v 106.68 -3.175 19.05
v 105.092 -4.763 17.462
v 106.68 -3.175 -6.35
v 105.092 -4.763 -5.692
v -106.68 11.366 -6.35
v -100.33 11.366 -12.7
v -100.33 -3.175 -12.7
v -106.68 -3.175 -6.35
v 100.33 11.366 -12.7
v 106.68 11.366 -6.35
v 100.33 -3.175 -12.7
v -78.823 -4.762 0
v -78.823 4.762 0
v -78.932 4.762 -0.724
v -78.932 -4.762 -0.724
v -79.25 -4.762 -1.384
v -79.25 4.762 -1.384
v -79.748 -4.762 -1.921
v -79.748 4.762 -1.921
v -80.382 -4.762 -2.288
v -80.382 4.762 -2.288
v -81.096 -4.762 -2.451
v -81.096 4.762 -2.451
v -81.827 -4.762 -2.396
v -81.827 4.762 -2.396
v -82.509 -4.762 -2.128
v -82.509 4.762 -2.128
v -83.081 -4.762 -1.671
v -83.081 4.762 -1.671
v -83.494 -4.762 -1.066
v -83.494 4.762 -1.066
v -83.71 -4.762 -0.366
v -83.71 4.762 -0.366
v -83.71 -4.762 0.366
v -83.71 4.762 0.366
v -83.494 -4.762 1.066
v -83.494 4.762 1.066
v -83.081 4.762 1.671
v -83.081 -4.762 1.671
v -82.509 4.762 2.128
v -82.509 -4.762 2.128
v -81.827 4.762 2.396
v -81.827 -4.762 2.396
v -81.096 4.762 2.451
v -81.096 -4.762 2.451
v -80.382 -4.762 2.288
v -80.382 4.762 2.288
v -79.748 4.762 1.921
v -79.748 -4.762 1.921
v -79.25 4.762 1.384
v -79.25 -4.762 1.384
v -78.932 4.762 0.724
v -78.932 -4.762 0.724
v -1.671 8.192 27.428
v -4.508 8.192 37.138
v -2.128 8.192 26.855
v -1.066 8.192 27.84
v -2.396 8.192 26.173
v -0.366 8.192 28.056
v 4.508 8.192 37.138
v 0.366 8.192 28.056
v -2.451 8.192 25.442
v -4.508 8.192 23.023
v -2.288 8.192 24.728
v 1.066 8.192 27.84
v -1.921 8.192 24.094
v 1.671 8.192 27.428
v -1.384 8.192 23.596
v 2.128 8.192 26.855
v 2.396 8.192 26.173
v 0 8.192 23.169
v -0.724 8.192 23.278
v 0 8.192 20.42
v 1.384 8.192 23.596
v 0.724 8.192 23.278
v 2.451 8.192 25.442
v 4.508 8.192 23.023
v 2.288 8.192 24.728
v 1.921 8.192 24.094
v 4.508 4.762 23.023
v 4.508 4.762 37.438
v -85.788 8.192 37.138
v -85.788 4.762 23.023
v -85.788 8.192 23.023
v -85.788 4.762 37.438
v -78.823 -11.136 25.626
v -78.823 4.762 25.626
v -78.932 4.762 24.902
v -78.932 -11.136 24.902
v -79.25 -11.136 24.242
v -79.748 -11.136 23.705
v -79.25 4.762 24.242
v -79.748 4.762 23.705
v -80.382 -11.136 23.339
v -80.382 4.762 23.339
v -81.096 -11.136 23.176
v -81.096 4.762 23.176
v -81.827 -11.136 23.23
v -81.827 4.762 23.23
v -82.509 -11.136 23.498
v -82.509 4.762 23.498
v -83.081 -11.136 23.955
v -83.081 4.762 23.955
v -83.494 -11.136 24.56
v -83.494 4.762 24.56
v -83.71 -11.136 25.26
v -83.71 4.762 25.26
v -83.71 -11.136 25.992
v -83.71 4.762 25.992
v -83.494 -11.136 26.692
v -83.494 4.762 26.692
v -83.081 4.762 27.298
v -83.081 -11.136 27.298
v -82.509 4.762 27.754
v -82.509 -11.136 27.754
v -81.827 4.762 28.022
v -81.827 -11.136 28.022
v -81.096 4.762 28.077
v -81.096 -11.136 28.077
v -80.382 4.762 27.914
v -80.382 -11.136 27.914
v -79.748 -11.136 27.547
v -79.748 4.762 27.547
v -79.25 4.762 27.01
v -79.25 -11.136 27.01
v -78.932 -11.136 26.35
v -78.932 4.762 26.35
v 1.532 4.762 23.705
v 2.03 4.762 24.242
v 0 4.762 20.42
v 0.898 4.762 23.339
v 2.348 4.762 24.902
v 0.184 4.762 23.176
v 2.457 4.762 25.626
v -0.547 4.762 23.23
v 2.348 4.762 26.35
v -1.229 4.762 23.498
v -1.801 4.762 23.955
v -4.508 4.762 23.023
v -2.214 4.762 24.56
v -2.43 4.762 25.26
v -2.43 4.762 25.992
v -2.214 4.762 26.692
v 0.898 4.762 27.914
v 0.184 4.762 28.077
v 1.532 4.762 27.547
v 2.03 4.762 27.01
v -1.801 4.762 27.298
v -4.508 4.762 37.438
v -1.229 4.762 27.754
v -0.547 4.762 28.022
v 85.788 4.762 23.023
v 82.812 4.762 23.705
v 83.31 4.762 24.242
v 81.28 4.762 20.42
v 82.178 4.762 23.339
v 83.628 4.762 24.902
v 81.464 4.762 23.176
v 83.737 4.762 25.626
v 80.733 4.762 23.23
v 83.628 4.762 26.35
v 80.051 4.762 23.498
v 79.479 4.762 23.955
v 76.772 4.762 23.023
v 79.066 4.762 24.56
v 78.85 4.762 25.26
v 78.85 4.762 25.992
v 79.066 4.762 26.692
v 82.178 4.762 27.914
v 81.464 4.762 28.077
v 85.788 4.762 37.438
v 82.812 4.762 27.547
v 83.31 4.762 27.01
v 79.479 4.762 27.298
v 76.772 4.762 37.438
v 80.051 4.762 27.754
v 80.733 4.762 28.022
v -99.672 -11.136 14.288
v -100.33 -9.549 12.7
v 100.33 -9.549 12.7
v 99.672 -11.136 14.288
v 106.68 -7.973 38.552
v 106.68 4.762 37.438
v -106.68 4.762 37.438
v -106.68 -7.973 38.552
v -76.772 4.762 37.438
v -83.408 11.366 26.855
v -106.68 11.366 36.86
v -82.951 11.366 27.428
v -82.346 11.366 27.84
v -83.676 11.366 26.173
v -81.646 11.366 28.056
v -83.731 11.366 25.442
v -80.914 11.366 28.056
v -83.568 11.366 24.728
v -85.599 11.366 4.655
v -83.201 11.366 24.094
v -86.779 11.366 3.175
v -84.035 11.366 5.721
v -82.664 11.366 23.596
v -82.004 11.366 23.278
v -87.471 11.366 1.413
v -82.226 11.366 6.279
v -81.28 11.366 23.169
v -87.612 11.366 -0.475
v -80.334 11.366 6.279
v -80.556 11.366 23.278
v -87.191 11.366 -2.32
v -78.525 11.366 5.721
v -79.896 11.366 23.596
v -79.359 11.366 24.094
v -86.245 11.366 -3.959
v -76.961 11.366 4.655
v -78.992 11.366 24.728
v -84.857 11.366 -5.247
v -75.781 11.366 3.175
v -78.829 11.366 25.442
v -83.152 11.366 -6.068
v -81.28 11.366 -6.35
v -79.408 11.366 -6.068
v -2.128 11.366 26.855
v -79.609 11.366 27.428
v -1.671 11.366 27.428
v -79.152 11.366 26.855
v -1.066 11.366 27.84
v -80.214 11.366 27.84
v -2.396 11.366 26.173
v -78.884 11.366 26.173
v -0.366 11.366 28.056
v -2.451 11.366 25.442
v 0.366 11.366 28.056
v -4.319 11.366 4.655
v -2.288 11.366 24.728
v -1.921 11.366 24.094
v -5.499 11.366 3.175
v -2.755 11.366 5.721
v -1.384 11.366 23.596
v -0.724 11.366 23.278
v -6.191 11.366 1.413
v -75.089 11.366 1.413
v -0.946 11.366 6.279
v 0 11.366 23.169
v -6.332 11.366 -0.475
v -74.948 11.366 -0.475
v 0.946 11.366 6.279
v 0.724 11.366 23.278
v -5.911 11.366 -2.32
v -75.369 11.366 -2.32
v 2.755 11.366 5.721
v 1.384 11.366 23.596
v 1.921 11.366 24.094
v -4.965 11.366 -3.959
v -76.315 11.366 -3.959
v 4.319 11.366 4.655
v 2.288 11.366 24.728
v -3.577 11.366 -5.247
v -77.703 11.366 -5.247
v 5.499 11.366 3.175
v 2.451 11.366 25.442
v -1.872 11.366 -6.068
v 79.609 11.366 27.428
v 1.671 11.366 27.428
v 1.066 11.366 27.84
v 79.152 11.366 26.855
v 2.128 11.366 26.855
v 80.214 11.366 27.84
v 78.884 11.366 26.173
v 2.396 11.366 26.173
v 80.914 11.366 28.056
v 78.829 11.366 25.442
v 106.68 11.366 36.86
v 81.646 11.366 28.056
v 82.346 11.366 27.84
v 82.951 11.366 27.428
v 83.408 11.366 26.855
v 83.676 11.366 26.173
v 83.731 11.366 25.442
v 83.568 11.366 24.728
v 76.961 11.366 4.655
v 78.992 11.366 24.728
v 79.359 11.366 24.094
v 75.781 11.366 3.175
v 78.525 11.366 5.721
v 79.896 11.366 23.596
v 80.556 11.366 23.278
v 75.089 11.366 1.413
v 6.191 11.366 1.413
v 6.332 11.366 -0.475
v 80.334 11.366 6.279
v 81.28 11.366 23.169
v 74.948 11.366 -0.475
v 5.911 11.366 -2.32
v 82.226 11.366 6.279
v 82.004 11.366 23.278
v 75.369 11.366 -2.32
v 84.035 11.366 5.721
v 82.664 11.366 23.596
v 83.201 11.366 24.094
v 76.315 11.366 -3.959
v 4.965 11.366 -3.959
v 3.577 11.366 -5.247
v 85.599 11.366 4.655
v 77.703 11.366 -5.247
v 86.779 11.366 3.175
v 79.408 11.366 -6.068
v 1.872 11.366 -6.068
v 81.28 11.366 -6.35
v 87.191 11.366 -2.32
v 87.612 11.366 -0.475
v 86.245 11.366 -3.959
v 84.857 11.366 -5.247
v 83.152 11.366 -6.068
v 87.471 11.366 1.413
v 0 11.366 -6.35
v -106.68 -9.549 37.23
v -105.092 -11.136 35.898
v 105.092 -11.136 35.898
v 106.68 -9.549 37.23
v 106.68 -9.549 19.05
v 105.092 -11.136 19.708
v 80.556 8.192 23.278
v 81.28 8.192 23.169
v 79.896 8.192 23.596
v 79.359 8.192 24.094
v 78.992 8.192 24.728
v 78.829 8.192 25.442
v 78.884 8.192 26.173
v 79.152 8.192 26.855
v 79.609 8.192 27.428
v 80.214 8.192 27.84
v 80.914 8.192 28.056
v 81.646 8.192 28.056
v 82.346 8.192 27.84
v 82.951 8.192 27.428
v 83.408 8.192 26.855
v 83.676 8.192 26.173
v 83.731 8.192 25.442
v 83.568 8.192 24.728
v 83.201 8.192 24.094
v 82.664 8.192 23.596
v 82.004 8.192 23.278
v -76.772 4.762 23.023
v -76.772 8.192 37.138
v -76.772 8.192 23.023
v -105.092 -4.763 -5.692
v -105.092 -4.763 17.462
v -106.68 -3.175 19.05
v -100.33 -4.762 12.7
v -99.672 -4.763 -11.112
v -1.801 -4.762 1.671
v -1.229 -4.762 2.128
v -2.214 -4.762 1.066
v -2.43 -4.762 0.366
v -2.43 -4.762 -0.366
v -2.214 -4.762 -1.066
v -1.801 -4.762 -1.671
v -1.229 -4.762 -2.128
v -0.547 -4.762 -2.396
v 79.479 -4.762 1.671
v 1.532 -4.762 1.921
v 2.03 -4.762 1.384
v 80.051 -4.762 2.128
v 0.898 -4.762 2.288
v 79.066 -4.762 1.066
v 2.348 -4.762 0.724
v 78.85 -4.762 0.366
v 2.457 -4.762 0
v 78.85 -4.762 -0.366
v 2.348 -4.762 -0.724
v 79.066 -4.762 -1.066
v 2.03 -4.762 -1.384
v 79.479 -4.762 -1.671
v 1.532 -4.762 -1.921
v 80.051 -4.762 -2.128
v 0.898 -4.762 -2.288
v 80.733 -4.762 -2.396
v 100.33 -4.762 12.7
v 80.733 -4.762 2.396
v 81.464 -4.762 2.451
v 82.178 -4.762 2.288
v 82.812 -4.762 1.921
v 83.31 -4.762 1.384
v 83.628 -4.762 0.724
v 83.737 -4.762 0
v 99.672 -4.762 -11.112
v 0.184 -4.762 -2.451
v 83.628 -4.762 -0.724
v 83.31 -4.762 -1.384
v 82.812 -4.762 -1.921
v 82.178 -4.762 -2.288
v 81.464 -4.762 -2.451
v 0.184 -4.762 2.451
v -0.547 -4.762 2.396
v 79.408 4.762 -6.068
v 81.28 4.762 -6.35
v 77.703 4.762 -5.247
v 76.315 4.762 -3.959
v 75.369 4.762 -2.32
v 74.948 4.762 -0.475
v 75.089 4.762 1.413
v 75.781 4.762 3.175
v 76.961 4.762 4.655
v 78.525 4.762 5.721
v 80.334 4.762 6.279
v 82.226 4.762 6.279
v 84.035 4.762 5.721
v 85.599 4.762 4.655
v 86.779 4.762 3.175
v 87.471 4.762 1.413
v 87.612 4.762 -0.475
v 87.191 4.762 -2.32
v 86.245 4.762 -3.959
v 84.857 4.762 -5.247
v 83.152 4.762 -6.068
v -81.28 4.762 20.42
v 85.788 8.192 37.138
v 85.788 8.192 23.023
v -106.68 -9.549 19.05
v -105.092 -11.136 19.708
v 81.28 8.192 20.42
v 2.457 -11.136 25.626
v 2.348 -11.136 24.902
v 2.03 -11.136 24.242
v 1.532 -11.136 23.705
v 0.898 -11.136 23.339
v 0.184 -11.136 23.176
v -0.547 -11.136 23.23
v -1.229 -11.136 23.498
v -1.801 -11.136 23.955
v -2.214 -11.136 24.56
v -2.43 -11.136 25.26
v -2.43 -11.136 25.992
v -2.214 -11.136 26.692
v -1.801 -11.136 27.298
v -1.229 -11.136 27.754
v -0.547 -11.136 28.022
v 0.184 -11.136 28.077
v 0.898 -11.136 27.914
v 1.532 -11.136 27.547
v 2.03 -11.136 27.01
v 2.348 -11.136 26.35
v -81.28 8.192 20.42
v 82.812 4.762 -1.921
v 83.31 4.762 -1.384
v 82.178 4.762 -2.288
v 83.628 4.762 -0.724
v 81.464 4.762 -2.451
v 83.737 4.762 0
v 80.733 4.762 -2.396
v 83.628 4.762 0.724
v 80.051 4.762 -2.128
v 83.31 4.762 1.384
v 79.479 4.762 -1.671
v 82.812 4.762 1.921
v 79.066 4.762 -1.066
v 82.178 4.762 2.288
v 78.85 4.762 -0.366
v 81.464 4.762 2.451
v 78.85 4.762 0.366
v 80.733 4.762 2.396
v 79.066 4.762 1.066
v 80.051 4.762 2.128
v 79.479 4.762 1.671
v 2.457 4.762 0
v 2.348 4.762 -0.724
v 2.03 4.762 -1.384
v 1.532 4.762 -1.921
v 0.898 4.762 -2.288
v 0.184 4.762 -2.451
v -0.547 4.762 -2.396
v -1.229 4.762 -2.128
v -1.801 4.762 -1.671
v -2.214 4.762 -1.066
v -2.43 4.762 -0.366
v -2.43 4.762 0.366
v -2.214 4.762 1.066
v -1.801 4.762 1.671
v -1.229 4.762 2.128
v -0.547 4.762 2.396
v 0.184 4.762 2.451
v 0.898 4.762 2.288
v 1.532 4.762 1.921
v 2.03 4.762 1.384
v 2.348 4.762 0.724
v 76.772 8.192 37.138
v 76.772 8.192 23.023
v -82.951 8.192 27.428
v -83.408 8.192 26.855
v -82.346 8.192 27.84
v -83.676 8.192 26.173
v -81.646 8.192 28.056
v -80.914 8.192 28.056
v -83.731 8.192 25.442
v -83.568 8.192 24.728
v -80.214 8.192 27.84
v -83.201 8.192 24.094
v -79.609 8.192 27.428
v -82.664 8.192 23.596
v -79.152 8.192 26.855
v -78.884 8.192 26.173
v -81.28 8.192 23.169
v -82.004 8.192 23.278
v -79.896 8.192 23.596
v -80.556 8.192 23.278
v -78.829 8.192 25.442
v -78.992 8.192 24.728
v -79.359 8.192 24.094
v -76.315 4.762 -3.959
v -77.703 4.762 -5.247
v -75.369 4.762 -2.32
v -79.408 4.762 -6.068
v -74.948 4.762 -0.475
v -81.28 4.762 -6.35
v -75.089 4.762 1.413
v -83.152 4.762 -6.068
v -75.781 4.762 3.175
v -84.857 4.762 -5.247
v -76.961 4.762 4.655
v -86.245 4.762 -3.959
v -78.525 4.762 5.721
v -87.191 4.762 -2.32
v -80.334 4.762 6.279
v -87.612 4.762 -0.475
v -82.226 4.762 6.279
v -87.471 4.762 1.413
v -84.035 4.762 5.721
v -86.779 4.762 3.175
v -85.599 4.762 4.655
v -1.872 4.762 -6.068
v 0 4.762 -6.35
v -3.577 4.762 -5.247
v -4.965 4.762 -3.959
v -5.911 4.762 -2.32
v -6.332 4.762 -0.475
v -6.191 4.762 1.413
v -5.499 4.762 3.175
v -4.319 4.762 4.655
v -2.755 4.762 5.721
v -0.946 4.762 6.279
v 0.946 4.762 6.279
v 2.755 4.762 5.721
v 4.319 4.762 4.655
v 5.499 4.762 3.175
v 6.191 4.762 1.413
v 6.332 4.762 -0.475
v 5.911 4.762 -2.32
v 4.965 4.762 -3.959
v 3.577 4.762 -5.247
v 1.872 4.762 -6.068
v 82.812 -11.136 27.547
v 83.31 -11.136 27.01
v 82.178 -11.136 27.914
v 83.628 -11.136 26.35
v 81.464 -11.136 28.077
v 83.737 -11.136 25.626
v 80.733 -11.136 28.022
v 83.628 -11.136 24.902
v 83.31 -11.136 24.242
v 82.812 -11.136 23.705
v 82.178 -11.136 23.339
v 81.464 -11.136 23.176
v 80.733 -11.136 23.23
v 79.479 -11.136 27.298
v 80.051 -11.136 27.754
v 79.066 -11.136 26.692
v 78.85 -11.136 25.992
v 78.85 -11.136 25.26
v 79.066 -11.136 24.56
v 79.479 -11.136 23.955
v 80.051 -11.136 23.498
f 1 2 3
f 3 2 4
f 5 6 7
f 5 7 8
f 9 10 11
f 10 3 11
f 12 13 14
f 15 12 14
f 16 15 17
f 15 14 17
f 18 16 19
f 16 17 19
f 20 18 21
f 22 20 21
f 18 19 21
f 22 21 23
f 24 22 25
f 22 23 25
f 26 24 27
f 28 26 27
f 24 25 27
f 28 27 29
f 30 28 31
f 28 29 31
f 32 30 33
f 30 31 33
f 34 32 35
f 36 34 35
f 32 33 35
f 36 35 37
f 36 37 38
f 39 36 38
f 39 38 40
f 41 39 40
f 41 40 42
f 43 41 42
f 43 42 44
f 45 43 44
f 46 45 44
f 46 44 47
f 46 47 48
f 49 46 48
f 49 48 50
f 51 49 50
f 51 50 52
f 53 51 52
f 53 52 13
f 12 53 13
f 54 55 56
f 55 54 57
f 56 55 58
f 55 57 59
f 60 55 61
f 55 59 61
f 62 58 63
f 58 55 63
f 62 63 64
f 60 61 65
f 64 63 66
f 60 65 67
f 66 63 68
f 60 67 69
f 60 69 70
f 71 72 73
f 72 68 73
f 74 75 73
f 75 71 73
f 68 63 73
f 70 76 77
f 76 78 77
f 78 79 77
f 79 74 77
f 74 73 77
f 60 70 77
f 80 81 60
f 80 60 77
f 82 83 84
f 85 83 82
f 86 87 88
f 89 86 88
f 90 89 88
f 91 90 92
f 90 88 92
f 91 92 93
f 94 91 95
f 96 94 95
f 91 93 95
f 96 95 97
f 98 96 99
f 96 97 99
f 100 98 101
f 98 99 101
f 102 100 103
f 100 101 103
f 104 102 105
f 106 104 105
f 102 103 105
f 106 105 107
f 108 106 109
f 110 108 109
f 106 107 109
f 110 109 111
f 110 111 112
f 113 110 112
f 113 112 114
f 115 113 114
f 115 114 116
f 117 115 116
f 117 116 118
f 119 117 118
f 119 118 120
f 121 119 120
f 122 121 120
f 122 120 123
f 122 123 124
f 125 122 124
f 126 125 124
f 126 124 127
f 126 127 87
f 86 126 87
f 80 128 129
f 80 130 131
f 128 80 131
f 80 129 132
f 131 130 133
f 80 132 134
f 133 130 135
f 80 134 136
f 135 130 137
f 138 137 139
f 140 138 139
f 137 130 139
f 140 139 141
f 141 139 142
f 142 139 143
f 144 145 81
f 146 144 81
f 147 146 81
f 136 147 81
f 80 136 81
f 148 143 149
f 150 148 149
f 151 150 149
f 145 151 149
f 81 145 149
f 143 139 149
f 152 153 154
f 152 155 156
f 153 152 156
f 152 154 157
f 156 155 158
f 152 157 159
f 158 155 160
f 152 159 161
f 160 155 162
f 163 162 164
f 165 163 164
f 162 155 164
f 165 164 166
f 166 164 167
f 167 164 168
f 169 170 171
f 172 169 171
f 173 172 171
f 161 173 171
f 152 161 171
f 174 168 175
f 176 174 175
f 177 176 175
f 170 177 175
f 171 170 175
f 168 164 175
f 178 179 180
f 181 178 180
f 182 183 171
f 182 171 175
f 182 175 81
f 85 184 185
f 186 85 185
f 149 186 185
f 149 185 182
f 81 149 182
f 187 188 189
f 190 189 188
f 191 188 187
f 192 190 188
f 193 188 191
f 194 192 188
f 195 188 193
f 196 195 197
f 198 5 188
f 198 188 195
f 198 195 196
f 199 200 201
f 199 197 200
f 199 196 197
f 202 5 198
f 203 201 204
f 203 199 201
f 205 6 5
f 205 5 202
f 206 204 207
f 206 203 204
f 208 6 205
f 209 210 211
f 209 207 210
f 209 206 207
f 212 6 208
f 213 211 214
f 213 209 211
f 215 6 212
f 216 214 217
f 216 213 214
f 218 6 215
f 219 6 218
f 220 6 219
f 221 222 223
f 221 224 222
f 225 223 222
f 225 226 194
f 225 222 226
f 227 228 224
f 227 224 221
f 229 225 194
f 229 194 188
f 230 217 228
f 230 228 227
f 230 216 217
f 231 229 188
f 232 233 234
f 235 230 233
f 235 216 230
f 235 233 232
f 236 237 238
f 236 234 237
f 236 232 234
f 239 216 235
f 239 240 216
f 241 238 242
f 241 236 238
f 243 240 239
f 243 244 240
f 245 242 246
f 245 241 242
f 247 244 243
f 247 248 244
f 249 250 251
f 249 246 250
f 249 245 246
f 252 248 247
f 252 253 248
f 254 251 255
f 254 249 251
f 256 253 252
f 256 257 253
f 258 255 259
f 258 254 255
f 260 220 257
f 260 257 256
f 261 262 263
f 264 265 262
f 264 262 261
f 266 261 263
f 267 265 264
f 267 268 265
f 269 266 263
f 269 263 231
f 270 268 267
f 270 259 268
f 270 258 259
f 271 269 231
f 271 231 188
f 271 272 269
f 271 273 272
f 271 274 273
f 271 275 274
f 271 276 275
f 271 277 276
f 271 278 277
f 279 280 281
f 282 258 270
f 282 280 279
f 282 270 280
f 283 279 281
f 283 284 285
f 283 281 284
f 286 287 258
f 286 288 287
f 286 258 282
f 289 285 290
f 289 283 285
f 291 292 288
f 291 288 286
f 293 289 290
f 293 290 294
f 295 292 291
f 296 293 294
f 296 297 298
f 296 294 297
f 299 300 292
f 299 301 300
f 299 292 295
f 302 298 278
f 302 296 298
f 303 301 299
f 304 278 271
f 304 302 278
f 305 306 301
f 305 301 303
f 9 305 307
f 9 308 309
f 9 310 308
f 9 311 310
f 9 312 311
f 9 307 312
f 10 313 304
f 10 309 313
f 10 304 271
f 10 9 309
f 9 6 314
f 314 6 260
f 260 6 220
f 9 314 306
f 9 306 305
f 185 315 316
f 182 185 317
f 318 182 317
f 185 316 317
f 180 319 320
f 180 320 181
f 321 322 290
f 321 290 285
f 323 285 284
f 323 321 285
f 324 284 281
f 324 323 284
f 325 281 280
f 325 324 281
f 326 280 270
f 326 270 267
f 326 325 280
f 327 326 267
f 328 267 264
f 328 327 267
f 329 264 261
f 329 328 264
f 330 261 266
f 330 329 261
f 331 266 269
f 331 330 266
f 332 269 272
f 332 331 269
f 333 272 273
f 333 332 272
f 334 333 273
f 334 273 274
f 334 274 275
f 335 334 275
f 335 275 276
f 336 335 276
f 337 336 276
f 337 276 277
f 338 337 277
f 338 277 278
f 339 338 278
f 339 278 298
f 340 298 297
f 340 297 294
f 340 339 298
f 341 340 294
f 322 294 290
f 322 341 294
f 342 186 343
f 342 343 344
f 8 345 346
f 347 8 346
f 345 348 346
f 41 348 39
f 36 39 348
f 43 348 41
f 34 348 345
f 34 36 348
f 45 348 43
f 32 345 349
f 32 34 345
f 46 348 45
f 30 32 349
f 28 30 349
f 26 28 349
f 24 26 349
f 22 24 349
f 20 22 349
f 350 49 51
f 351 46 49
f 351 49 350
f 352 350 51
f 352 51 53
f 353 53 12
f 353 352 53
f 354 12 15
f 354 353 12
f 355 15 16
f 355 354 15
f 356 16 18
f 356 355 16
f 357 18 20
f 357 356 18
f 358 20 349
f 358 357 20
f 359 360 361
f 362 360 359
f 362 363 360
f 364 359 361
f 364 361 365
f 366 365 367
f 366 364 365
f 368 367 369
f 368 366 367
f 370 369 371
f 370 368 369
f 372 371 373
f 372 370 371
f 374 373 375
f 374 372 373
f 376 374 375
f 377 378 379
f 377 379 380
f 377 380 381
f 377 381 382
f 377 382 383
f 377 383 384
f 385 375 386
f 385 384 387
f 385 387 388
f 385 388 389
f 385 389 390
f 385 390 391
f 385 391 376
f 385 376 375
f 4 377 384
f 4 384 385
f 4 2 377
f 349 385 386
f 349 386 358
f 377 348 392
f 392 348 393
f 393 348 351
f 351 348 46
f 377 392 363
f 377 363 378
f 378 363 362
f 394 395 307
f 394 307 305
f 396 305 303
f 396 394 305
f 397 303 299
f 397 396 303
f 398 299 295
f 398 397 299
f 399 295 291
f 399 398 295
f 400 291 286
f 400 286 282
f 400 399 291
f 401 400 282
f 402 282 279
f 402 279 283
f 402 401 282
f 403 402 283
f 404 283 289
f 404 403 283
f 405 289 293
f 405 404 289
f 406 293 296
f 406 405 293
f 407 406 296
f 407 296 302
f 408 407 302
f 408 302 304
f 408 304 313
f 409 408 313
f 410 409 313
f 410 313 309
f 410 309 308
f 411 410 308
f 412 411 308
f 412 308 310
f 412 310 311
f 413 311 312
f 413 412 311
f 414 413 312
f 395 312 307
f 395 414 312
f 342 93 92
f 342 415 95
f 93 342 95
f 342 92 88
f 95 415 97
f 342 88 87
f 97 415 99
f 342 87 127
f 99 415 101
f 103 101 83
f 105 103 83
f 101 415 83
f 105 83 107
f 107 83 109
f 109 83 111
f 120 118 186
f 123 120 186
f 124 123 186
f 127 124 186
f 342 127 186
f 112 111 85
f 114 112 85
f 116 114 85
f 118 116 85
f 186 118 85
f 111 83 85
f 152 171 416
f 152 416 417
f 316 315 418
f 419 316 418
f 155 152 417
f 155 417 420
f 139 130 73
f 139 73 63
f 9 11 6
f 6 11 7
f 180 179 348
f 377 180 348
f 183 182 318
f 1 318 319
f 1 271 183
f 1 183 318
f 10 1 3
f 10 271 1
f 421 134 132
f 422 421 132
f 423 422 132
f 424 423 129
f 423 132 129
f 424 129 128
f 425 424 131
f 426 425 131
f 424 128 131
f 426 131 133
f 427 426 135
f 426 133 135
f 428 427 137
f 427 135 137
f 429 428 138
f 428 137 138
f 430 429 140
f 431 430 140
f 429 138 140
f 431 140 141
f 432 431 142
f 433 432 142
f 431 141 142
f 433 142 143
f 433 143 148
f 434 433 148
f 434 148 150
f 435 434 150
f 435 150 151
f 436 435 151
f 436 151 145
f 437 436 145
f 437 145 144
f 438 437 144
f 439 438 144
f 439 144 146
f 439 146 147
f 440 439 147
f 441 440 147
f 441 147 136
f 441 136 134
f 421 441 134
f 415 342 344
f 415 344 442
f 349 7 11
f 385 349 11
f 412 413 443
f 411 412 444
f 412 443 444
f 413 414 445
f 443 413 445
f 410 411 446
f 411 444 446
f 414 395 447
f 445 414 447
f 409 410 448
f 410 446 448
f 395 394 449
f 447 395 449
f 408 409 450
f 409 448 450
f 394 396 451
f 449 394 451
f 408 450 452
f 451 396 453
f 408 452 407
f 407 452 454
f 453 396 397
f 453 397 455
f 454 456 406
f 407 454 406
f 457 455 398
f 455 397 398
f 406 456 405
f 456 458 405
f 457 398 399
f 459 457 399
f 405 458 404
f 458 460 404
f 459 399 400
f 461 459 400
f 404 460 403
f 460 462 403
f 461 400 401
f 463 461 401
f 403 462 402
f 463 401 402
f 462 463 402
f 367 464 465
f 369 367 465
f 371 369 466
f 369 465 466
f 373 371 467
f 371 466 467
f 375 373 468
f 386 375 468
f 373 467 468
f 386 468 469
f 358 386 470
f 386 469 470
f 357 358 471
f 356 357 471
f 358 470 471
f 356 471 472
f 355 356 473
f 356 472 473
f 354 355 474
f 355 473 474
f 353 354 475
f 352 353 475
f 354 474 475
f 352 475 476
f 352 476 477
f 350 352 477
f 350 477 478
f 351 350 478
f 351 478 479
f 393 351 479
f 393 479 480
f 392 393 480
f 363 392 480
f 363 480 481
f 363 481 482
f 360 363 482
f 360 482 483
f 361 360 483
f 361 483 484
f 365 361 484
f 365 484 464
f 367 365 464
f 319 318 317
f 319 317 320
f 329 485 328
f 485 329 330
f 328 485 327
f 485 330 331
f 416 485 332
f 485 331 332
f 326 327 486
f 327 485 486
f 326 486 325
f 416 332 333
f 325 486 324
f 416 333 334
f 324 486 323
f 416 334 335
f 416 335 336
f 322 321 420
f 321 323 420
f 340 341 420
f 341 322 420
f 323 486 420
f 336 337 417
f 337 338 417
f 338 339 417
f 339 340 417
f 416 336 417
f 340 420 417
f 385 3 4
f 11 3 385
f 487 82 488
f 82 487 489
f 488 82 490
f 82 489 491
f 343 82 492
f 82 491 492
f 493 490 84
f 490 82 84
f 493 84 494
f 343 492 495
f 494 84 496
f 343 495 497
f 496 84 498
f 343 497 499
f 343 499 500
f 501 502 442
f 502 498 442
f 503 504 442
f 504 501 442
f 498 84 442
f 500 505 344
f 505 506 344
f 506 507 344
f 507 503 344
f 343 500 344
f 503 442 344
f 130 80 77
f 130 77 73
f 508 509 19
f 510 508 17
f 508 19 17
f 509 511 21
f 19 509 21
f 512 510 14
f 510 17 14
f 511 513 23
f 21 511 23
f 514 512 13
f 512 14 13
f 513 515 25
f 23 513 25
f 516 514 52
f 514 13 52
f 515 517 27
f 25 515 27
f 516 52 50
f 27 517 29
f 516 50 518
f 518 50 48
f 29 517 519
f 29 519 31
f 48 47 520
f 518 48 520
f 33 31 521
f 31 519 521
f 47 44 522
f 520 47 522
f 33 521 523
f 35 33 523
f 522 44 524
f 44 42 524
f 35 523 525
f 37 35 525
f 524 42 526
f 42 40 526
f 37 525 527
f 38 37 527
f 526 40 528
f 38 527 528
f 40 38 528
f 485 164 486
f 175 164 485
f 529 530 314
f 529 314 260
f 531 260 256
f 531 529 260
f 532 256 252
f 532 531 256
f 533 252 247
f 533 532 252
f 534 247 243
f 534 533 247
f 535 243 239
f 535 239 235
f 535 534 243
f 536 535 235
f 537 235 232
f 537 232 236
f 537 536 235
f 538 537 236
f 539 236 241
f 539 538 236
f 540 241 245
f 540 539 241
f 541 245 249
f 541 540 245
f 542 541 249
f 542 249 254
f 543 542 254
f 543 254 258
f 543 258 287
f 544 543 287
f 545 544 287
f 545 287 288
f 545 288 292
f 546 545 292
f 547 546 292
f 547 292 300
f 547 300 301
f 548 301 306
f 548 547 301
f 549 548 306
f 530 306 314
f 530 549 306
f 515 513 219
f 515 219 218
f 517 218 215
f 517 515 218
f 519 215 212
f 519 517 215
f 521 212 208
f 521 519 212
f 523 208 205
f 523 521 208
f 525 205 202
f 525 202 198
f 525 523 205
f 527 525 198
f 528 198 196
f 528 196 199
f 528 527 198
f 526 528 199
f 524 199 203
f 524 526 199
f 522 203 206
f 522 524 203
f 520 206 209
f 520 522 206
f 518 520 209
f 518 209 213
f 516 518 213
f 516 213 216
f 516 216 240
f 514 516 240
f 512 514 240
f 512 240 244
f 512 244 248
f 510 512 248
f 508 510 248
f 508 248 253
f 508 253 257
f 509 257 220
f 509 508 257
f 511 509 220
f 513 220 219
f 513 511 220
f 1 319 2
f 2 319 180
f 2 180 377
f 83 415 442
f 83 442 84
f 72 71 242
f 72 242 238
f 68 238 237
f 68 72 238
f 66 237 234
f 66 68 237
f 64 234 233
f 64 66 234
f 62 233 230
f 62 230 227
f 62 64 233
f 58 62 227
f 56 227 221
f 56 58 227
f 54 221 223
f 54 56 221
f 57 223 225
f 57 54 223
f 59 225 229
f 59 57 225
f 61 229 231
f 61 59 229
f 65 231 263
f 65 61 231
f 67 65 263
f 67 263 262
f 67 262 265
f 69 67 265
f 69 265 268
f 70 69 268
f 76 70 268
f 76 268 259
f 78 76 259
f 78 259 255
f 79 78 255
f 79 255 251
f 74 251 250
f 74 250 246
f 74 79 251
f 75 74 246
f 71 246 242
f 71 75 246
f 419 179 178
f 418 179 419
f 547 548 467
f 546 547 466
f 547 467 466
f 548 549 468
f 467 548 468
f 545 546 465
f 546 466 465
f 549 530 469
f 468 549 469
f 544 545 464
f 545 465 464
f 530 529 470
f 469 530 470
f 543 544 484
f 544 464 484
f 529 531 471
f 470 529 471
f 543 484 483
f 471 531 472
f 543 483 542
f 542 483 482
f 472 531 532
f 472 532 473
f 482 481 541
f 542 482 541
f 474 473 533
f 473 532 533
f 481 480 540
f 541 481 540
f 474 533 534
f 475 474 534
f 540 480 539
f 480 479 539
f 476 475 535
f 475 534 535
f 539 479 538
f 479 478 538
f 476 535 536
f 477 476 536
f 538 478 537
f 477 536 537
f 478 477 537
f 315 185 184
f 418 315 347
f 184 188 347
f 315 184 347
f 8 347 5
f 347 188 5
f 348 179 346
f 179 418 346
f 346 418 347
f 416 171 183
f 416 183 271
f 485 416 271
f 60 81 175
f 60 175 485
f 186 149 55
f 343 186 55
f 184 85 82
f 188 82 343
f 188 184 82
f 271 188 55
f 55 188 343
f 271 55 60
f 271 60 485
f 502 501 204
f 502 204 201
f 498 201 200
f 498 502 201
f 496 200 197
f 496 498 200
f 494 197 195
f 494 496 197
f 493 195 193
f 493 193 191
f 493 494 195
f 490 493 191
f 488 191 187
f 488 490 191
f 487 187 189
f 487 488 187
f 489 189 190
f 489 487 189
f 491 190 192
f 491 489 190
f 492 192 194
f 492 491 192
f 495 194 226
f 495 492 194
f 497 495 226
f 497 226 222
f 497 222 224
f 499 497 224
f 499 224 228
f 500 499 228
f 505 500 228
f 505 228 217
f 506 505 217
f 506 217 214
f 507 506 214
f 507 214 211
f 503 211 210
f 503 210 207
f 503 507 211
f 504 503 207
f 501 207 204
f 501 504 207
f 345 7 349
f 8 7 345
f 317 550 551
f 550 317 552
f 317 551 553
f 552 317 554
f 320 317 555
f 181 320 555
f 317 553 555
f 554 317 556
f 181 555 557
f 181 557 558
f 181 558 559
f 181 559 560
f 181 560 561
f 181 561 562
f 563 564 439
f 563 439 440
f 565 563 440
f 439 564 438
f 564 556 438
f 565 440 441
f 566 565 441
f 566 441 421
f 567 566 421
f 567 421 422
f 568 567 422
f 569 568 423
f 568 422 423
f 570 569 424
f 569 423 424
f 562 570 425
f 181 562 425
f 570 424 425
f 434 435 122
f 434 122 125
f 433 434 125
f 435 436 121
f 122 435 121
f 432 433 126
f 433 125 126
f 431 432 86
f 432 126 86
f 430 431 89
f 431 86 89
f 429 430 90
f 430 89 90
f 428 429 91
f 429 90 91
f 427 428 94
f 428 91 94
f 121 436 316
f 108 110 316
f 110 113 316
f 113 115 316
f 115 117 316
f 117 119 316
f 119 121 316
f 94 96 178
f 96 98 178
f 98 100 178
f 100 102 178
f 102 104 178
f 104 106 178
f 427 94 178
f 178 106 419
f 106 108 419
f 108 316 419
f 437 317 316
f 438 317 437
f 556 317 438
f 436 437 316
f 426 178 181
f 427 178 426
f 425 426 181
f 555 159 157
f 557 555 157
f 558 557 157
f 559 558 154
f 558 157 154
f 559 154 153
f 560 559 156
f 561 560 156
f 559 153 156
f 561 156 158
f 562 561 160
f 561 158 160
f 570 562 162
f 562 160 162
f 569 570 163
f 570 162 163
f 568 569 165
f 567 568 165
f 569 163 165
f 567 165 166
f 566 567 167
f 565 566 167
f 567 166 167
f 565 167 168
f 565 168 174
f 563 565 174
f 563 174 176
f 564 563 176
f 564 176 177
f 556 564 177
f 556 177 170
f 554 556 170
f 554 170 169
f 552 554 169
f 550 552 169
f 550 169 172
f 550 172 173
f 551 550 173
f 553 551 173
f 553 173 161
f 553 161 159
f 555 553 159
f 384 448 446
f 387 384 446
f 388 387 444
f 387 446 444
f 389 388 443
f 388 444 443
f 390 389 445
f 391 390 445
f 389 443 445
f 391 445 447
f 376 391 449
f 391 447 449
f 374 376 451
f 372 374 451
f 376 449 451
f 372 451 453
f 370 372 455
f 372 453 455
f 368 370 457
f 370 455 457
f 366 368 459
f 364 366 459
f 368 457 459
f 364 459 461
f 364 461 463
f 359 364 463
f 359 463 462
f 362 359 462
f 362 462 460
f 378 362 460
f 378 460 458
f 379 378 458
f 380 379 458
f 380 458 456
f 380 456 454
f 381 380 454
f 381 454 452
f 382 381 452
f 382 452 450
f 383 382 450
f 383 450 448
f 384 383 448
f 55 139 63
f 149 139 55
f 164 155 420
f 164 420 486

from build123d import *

# Parameters (mm, degrees)
SKETCH1_W             = 25.4
SKETCH1_H             = 9.525
BOSS_EXTRUDE1_DEPTH   = 106.68
BOSS_EXTRUDE2_DEPTH   = 213.36
CHAMFER1_SIZE         = 6.35
CHAMFER2_SIZE         = 3.175
CHAMFER2_SIZE2        = 2.93072295
F_8_CLEARANCE_HOLE1_D = 4.9149
CHAMFER3_SIZE         = 1.5875
BOSS_EXTRUDE3_DEPTH   = 3.429
SKETCH6_W             = 15.367
SKETCH6_H             = 20.192862299
SKETCH6_R             = 2.45745
BOSS_EXTRUDE4_DEPTH   = 3.175
SKETCH7_R             = 6.35
BOSS_EXTRUDE5_DEPTH   = 6.604
CUT_EXTRUDE1_DEPTH    = 218.112793351


with BuildPart() as part:
    # Sketch1 → Boss-Extrude1 (new, symmetric)
    with BuildSketch(Plane(origin=(0, 0, 0), x_dir=(0, 0, -1), z_dir=(1, 0, 0))):
        Rectangle(SKETCH1_W, SKETCH1_H)
    extrude(amount=BOSS_EXTRUDE1_DEPTH, both=True)

    # Sketch2 → Boss-Extrude2 (add, through all)
    with BuildSketch(Plane.ZY.offset(106.68)):
        Polygon((12.7, 4.7625), (37.438033761, 4.7625), (38.828997162, -11.13628443), (12.7, -11.13628443), align=None)
    extrude(amount=-BOSS_EXTRUDE2_DEPTH)

    # Chamfer1
    chamfer1_edges = [part.edges().sort_by_distance(p)[0] for p in [
        (106.68, 0, -12.7),
        (106.68, -7.949392215, 12.7),
        (-106.68, -7.949392215, 12.7),
        (-106.68, 0, -12.7),
    ]]
    chamfer(chamfer1_edges, length=CHAMFER1_SIZE)

    # Chamfer2
    chamfer2_edges = [part.edges().sort_by_distance(p)[0] for p in [
        (0, -11.13628443, 38.828997162),
    ]]
    chamfer2_side = [part.faces().sort_by_distance(p)[0] for p in [
        (0, -3.186892215, 38.133515462),
    ]]
    chamfer(chamfer2_edges, length=CHAMFER2_SIZE, length2=CHAMFER2_SIZE2, reference=chamfer2_side[0])

    # #8 Clearance Hole1 (through all)
    with Locations(Plane(origin=(0, -11.13628443, 0), x_dir=(-1, 0, 0), z_dir=(0, -1, 0))):
        with Locations((-81.28, -25.62613884), (0, 0), (0, -25.62613884), (81.28, -25.62613884), (81.28, 0), (-81.28, 0)):
            Hole(F_8_CLEARANCE_HOLE1_D / 2)

    # Chamfer3
    chamfer3_edges = [part.edges().sort_by_distance(p)[0] for p in [
        (0, -11.13628443, 12.7),
        (-106.68, -11.13628443, 27.474137106),
        (106.68, -11.13628443, 27.474137106),
        (-103.505, -11.13628443, 15.875),
        (103.505, -11.13628443, 15.875),
        (0, -4.7625, -12.7),
        (-103.505, -4.7625, -9.525),
        (103.505, -4.7625, -9.525),
        (-106.68, -4.7625, 6.35),
        (106.68, -4.7625, 6.35),
    ]]
    chamfer(chamfer3_edges, length=CHAMFER3_SIZE)

    # Sketch5 → Boss-Extrude3 (add)
    with BuildSketch(Plane(origin=(0, 4.7625, 0), x_dir=(1, 0, 0), z_dir=(0, 1, 0))):
        Polygon((85.7885, -37.438033761), (85.7885, -23.023155151), (81.28, -20.420171462), (76.7715, -23.023155151), (76.7715, -37.438033761), (73.5965, -37.438033761), (73.5965, -17.245171462), (88.9635, -17.245171462), (88.9635, -37.438033761), align=None)
        Polygon((4.5085, -37.438033761), (4.5085, -23.023155151), (0, -20.420171462), (-4.5085, -23.023155151), (-4.5085, -37.438033761), (-7.6835, -37.438033761), (-7.6835, -17.245171462), (7.6835, -17.245171462), (7.6835, -37.438033761), align=None)
        Polygon((-76.7715, -37.438033761), (-76.7715, -23.023155151), (-81.28, -20.420171462), (-85.7885, -23.023155151), (-85.7885, -37.438033761), (-88.9635, -37.438033761), (-88.9635, -17.245171462), (-73.5965, -17.245171462), (-73.5965, -37.438033761), align=None)
    extrude(amount=BOSS_EXTRUDE3_DEPTH)

    # Sketch6 → Boss-Extrude4 (add)
    with BuildSketch(Plane(origin=(0, 8.1915, 0), x_dir=(1, 0, 0), z_dir=(0, 1, 0))):
        with Locations((-81.28, -27.341602612)):
            Rectangle(SKETCH6_W, SKETCH6_H)
        with Locations(Location((-81.28, -25.62613884, 0), (0, 0, 90))):
            Circle(SKETCH6_R, mode=Mode.SUBTRACT)
        with Locations((0, -27.341602612)):
            Rectangle(SKETCH6_W, SKETCH6_H)
        with Locations(Location((0, -25.62613884, 0), (0, 0, 90))):
            Circle(SKETCH6_R, mode=Mode.SUBTRACT)
        with Locations((81.28, -27.341602612)):
            Rectangle(SKETCH6_W, SKETCH6_H)
        with Locations(Location((81.28, -25.62613884, 0), (0, 0, 90))):
            Circle(SKETCH6_R, mode=Mode.SUBTRACT)
    extrude(amount=BOSS_EXTRUDE4_DEPTH)

    # Sketch7 → Boss-Extrude5 (add)
    with BuildSketch(Plane(origin=(0, 4.7625, 0), x_dir=(1, 0, 0), z_dir=(0, 1, 0))):
        Polygon((-73.5965, -17.245171462), (-73.5965, -37.438033761), (-7.6835, -37.438033761), (-7.6835, -17.245171462), (7.6835, -17.245171462), (7.6835, -37.438033761), (73.5965, -37.438033761), (73.5965, -17.245171462), (88.9635, -17.245171462), (88.9635, -37.438033761), (106.68, -37.438033761), (106.68, 6.35), (100.33, 12.7), (-100.33, 12.7), (-106.68, 6.35), (-106.68, -37.438033761), (-88.9635, -37.438033761), (-88.9635, -17.245171462), align=None)
        with Locations(Location((81.28, 0, 0), (0, 0, 90))):
            Circle(SKETCH7_R, mode=Mode.SUBTRACT)
        with Locations(Location((0, 0, 0), (0, 0, 90))):
            Circle(SKETCH7_R, mode=Mode.SUBTRACT)
        with Locations(Location((-81.28, 0, 0), (0, 0, 90))):
            Circle(SKETCH7_R, mode=Mode.SUBTRACT)
    extrude(amount=BOSS_EXTRUDE5_DEPTH)

    # Sketch8 → Cut-Extrude1 (cut, through all)
    with BuildSketch(Plane.ZY.offset(106.68)):
        Polygon((37.438033761, 4.7625), (36.860258627, 11.3665), (37.438033761, 11.3665), align=None)
    extrude(amount=-CUT_EXTRUDE1_DEPTH, mode=Mode.SUBTRACT)


solid = part.part
